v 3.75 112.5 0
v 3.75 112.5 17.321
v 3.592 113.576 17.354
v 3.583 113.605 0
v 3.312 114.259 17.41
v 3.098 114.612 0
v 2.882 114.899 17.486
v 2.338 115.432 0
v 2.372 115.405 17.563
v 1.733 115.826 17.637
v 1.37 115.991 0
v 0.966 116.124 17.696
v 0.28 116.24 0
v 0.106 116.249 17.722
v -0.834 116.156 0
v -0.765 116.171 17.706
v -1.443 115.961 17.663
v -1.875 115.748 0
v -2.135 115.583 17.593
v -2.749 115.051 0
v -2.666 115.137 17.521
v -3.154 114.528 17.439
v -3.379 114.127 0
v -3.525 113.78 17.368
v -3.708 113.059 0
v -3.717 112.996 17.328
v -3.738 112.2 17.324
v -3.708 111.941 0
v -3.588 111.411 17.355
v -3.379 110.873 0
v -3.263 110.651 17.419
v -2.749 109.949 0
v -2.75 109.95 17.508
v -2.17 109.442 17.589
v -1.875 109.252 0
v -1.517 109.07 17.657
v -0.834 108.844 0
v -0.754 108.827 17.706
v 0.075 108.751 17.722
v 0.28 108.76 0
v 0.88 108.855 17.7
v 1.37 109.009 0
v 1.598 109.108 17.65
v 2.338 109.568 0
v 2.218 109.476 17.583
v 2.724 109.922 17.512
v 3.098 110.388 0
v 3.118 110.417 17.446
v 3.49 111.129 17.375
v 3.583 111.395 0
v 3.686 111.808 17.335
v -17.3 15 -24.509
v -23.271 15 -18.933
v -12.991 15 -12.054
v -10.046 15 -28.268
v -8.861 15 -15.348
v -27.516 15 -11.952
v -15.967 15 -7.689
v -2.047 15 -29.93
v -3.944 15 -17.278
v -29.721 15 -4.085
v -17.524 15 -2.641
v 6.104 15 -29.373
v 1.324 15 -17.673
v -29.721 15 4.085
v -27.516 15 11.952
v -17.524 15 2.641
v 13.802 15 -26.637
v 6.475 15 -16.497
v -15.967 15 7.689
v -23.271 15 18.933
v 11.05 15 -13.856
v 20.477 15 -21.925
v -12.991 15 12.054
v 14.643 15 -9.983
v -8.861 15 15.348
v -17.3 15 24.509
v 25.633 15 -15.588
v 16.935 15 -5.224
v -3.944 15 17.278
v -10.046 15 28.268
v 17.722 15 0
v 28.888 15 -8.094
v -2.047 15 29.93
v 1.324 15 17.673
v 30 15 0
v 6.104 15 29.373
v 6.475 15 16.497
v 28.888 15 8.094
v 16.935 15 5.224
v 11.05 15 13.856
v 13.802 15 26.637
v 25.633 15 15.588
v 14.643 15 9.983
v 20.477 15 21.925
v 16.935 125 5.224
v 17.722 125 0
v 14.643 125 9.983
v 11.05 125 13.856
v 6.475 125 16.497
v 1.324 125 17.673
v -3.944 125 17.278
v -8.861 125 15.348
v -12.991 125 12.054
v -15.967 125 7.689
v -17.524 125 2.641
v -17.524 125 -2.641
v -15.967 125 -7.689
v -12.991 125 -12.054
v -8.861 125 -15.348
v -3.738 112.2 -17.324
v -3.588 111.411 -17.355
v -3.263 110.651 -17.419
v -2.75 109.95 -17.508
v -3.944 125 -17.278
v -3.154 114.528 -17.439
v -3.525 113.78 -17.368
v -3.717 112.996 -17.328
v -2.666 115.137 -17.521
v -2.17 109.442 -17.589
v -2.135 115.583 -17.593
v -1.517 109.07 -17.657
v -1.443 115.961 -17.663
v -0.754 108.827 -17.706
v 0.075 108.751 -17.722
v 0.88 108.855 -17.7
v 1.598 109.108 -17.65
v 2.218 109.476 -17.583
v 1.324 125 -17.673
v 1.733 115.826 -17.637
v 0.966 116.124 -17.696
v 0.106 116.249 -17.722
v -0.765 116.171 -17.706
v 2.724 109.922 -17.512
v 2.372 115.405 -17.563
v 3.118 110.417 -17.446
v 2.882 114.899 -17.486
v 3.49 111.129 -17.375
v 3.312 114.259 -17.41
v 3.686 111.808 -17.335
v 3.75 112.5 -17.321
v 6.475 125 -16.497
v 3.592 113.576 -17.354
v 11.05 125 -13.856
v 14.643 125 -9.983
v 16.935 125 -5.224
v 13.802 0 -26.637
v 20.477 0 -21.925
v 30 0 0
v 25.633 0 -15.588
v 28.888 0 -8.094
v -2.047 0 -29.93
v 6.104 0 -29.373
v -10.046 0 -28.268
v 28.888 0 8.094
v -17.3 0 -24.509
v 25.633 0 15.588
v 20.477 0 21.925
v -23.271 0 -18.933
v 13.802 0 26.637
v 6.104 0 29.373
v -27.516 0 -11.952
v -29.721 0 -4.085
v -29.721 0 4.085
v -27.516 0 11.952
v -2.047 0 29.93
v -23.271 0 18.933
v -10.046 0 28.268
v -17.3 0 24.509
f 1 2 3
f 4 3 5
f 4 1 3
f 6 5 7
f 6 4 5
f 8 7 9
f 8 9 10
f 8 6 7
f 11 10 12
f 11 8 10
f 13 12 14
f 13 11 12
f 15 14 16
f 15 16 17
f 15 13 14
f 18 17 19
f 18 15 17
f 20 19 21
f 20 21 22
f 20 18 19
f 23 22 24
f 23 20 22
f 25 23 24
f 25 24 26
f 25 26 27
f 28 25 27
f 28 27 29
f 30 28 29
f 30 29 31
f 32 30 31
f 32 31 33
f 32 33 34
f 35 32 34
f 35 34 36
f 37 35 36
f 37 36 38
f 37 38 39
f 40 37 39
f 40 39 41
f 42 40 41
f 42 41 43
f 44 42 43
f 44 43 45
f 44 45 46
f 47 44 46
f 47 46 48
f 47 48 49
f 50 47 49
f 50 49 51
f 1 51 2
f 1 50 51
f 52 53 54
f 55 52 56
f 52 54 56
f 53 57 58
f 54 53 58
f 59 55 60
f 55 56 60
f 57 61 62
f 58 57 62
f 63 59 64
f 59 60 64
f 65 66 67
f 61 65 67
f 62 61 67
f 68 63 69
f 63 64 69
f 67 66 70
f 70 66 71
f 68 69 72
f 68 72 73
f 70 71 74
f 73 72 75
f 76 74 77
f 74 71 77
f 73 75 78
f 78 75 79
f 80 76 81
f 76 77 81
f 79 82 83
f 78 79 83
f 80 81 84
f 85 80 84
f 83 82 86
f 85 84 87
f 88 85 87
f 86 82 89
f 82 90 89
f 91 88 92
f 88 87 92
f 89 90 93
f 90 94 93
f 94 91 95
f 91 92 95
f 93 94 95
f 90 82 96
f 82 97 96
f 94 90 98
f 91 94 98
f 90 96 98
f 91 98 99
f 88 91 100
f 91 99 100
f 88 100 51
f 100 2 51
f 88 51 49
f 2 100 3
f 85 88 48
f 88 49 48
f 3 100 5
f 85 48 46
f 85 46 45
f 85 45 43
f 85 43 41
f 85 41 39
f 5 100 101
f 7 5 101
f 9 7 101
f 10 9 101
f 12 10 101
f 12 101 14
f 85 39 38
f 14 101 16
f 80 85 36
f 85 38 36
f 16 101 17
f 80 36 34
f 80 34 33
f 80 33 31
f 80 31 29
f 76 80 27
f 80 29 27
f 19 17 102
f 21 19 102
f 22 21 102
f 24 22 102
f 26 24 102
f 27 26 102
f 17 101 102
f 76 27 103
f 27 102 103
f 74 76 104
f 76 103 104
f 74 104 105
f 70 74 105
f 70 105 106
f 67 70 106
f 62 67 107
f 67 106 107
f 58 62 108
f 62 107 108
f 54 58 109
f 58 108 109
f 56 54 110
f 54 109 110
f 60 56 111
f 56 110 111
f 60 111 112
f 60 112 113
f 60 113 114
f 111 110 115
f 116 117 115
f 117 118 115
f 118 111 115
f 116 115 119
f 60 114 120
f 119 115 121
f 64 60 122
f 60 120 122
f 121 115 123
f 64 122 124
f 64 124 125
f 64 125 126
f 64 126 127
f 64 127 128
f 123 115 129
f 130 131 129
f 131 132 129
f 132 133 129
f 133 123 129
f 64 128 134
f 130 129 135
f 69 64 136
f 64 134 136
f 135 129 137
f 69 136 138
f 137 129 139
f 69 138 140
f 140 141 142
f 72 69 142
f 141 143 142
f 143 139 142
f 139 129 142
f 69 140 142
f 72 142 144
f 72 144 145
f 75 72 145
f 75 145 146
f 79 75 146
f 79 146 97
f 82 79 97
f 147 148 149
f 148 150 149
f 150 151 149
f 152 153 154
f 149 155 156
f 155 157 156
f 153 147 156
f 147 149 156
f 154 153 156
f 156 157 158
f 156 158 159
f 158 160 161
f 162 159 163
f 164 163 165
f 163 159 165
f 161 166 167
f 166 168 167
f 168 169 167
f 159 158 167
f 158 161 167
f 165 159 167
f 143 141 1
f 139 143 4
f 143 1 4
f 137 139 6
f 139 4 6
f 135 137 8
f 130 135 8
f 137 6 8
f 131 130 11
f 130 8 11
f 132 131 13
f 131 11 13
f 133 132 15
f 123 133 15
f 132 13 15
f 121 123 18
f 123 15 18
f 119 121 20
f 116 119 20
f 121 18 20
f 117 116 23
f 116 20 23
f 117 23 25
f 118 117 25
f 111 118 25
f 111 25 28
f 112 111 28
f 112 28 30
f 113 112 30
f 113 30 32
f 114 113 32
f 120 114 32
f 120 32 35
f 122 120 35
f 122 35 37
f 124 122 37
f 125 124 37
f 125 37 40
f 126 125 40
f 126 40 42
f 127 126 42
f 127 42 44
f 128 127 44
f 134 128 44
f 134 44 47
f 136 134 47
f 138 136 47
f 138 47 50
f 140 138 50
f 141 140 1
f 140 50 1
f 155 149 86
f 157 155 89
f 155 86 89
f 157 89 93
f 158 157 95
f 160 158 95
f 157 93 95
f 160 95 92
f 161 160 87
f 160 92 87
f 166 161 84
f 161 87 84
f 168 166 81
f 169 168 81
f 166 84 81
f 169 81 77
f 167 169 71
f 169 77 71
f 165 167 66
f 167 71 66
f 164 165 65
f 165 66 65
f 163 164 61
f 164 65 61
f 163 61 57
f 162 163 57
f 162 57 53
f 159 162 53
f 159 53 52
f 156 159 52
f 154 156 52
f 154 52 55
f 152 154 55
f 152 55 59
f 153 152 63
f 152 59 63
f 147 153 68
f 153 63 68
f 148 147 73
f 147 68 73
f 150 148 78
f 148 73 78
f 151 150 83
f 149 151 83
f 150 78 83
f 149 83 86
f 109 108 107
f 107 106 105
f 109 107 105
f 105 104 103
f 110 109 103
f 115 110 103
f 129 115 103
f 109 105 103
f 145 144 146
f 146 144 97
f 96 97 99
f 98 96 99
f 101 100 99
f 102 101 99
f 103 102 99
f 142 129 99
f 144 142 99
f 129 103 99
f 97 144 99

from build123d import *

# Parameters (mm, degrees)
SKETCH3_R               = 3.75
CUT_EXTRUDE1_DEPTH      = 31
CUT_EXTRUDE1_DEPTH_BACK = 31


with BuildPart() as part:
    # Sketch2 → Revolve1 (revolve)
    with BuildSketch(Plane.XY):
        Polygon((0, 0), (30, 0), (30, 15), (17.7222, 15), (17.7222, 125), (0, 125), align=None)
    revolve(axis=Axis((0, 125, 0), (0, -1, 0)))

    # Sketch3 → Cut-Extrude1 (cut, two sides)
    with BuildSketch(Plane.XY) as cut_extrude1_sk:
        with Locations((0, 112.5)):
            Circle(SKETCH3_R)
    extrude(amount=CUT_EXTRUDE1_DEPTH, mode=Mode.SUBTRACT)
    extrude(cut_extrude1_sk.sketch, amount=-CUT_EXTRUDE1_DEPTH_BACK, mode=Mode.SUBTRACT)


solid = part.part
